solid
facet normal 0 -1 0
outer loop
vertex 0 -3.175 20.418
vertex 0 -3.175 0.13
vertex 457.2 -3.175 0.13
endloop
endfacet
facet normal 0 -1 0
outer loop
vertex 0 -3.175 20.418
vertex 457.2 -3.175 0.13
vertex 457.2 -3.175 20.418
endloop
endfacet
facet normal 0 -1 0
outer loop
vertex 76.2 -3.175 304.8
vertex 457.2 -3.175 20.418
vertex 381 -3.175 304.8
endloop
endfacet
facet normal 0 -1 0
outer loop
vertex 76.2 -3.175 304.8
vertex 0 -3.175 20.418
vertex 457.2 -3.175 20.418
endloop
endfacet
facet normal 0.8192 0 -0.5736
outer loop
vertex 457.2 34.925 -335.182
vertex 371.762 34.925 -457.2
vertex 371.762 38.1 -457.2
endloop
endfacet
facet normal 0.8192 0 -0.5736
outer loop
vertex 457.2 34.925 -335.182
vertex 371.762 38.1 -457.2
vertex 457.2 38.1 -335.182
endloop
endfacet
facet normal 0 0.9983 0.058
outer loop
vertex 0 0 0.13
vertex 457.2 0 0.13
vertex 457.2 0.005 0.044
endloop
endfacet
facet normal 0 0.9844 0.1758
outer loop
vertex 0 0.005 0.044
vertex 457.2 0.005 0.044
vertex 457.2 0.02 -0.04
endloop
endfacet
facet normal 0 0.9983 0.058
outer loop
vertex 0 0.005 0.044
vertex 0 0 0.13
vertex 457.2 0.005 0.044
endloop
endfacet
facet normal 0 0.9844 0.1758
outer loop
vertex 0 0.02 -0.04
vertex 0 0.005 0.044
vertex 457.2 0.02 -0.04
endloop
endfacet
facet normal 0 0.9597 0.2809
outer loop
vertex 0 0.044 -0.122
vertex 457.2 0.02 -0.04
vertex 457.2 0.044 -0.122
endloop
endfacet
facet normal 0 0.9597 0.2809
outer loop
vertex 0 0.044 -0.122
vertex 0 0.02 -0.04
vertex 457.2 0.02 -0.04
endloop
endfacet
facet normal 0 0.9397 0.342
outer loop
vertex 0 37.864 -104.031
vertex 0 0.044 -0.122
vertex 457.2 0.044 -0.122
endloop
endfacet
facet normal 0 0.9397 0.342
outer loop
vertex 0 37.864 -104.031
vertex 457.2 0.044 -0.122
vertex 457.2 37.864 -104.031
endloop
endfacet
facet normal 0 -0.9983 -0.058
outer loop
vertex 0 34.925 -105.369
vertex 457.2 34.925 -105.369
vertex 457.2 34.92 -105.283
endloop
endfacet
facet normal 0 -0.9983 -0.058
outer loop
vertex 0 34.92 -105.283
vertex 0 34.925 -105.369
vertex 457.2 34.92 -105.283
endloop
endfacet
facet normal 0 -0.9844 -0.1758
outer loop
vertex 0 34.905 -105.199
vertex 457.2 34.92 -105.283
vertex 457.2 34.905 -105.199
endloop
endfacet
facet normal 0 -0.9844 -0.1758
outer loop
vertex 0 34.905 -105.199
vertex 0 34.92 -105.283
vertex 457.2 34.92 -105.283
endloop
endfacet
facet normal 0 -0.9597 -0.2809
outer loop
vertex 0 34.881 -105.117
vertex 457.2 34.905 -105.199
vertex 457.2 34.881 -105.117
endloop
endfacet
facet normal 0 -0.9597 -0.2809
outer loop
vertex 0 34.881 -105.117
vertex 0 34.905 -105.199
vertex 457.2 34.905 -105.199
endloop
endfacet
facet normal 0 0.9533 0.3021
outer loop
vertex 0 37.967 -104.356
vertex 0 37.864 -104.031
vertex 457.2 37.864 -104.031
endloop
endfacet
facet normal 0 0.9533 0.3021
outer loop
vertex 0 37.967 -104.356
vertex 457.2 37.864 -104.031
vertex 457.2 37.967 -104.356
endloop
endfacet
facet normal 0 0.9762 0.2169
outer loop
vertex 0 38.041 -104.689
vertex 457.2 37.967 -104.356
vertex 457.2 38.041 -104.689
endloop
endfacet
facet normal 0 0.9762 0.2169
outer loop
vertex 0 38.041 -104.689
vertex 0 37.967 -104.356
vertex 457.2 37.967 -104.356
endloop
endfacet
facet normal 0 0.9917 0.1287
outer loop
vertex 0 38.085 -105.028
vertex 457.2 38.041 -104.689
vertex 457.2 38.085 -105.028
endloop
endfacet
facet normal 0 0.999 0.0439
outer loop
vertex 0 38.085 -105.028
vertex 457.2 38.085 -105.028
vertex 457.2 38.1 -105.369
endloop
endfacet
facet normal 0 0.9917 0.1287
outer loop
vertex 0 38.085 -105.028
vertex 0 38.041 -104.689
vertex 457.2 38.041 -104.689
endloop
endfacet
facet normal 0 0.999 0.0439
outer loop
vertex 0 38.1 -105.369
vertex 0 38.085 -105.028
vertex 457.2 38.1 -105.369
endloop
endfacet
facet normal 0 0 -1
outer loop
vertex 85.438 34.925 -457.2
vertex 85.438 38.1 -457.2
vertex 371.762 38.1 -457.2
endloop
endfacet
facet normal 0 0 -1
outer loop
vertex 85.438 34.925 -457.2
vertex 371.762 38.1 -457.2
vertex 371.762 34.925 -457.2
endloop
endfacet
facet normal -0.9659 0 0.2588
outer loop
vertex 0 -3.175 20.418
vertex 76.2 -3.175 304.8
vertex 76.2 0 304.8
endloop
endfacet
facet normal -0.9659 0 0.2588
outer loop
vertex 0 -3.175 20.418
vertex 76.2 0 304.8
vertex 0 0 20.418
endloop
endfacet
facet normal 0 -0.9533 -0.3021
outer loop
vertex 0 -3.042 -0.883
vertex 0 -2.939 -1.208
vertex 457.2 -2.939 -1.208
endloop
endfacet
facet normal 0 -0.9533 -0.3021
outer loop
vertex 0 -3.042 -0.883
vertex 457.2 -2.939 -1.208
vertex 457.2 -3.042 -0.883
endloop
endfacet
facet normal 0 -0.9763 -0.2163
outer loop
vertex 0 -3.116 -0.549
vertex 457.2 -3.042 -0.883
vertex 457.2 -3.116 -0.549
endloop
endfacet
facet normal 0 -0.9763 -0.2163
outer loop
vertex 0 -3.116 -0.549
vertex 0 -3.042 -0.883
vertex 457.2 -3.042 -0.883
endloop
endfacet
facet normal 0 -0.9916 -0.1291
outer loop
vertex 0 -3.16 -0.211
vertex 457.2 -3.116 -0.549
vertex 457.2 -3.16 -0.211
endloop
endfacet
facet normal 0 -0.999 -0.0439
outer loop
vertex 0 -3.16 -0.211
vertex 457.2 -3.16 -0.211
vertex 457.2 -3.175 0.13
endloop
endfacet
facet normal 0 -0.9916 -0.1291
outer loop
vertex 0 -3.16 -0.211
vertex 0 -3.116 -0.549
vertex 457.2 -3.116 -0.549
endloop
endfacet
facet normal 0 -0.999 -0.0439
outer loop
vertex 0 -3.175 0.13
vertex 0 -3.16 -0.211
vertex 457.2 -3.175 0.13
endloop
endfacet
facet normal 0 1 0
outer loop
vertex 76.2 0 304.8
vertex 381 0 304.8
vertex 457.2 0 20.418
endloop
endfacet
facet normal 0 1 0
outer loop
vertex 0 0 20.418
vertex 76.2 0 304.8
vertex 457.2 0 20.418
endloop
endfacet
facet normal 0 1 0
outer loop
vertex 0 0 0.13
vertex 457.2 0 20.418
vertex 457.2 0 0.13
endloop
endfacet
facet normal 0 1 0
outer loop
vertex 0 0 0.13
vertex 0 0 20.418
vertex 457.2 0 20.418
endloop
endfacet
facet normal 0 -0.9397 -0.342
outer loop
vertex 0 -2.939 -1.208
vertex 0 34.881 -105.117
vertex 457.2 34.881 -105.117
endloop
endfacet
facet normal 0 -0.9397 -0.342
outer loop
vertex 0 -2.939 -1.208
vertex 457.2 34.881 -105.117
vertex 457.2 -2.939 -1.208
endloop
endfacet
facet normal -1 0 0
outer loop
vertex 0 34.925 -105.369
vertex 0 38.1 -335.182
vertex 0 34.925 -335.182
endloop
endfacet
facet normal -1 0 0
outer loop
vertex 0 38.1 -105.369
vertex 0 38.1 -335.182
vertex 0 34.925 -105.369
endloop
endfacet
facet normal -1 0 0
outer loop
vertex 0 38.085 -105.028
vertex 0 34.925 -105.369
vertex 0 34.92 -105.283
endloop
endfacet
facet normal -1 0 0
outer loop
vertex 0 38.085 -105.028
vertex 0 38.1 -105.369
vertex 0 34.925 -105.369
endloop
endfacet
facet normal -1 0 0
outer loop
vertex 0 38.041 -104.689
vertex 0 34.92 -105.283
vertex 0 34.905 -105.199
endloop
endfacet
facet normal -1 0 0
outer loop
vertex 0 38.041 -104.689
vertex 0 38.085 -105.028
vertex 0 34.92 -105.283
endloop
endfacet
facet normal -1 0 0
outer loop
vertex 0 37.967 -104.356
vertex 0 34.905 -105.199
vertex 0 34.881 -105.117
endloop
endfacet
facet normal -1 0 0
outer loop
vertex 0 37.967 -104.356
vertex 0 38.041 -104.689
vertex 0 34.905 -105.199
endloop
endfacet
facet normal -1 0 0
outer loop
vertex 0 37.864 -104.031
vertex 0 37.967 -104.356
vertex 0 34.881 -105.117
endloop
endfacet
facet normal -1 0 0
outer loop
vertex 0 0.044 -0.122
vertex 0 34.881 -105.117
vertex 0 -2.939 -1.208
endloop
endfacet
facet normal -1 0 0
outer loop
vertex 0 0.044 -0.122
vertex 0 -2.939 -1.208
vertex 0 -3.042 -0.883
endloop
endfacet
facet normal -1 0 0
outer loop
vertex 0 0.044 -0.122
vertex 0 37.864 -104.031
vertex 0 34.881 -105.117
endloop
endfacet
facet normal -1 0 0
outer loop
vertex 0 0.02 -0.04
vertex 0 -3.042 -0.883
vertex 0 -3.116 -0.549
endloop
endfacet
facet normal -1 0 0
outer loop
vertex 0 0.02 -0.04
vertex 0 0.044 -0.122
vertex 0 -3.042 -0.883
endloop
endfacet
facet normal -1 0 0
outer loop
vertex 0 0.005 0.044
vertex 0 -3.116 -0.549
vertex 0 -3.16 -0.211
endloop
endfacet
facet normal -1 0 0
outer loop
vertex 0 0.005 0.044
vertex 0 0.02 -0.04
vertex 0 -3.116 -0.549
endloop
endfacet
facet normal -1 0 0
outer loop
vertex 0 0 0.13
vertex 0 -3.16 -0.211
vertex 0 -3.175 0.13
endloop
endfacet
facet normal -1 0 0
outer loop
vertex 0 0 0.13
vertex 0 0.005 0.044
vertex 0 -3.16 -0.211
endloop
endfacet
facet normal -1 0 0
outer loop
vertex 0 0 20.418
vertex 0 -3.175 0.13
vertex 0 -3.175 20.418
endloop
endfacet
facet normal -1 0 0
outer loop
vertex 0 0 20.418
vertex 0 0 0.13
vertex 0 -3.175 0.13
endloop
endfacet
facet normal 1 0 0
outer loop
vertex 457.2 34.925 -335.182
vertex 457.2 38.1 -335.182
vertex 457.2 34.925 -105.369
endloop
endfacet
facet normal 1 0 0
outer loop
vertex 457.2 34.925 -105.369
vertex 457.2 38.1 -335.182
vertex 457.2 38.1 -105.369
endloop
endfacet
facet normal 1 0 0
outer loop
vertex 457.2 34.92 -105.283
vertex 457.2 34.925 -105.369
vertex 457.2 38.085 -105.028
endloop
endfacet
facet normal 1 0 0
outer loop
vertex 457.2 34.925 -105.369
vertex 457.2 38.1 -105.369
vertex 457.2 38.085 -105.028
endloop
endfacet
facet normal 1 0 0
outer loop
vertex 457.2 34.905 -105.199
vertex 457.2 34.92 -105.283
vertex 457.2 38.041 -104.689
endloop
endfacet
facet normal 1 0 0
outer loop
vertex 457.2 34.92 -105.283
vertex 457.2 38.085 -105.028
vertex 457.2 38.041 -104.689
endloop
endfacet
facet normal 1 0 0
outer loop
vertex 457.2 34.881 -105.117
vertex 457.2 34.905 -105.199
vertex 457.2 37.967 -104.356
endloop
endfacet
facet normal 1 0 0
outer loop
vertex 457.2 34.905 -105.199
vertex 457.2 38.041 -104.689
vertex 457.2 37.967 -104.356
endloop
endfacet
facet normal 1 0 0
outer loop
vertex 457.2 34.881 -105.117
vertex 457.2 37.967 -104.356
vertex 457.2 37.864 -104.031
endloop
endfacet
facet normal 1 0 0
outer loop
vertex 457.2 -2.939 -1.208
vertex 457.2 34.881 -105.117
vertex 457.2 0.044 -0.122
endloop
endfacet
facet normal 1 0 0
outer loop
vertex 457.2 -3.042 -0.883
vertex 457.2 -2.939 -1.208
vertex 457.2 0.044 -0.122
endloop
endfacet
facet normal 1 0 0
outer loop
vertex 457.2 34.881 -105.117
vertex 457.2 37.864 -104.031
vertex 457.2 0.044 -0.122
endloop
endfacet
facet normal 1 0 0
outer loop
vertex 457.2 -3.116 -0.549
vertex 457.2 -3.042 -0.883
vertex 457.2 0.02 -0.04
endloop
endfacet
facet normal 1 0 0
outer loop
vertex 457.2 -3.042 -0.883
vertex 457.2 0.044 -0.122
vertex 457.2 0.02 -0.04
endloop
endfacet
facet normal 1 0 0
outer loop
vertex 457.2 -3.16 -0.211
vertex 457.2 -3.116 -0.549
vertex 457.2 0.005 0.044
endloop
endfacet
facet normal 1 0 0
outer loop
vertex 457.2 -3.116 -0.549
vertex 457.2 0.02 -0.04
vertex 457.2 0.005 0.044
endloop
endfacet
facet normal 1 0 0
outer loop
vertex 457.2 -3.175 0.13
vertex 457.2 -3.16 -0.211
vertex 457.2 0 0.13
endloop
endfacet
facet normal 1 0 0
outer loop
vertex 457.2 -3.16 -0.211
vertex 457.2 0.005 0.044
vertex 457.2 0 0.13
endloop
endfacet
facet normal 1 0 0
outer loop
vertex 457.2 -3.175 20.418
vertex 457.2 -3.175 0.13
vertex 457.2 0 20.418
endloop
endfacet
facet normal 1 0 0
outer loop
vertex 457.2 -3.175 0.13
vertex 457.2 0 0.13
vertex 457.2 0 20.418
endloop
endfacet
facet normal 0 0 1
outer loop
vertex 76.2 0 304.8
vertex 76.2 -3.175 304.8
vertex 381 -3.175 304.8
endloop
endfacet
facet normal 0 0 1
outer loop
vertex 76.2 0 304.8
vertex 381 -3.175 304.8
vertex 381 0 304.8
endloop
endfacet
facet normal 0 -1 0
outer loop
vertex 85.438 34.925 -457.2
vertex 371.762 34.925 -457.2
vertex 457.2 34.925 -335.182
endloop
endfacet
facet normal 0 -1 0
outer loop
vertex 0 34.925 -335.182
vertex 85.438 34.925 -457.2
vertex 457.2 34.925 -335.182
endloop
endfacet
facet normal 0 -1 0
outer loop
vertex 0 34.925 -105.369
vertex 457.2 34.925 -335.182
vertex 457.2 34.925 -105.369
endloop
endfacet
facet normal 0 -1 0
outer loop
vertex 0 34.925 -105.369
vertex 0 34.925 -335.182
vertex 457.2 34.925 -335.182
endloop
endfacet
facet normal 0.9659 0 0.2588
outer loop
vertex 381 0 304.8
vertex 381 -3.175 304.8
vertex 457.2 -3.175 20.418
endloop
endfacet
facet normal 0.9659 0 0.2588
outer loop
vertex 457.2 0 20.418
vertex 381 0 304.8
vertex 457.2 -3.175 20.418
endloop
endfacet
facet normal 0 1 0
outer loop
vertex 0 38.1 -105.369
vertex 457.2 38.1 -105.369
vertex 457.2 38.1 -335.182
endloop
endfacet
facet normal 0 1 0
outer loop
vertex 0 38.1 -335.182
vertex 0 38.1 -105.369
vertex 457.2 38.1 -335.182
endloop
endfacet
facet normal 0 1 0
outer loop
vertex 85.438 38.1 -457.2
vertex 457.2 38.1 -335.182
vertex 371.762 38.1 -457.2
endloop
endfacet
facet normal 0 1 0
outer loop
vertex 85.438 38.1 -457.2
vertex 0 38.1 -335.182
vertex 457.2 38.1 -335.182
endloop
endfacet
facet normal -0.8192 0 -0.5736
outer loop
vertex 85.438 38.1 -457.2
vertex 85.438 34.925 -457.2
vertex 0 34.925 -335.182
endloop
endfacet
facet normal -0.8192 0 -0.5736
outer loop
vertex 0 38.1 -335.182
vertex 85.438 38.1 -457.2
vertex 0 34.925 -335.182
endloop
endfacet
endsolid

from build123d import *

# Parameters (mm, degrees)
BASE_FLANGE1_DEPTH      = 457.2
CUT_EXTRUDE1_DEPTH      = 648.7
CUT_EXTRUDE1_DEPTH_BACK = 648.7


# Sheet-metal steps are written as plain solids
with BuildPart() as part:
    # Sketch1 → Base-Flange1 (new body)
    with BuildSketch(Plane(origin=(0, 0, 0), x_dir=(0, 0, -1), z_dir=(1, 0, 0))):
        with BuildLine():
            Line((-304.8, 0), (-0.129882454, 0))
            ThreePointArc((-0.129882454, 0), (-0.001973206, 0.011190609), (0.122049584, 0.044422416))
            Line((0.122049584, 0.044422416), (104.030764306, 37.864101655))
            ThreePointArc((104.030764306, 37.864101655), (104.689368087, 38.040574007), (105.368610299, 38.1))
            Line((105.368610299, 38.1), (457.2, 38.1))
            Line((457.2, 38.1), (457.2, 34.925))
            Line((457.2, 34.925), (105.368610299, 34.925))
            ThreePointArc((105.368610299, 34.925), (105.240701051, 34.913809391), (105.116678261, 34.880577584))
            Line((105.116678261, 34.880577584), (1.207963539, -2.939101655))
            ThreePointArc((1.207963539, -2.939101655), (0.549359758, -3.115574007), (-0.129882454, -3.175))
            Line((-0.129882454, -3.175), (-304.8, -3.175))
            Line((-304.8, -3.175), (-304.8, 0))
        make_face()
    extrude(amount=BASE_FLANGE1_DEPTH)

    # Sketch6 → Cut-Extrude1 (cut, two sides: drawn at the far end of the back side and taken through both)
    with BuildSketch(Plane(origin=(0, 0, 0), x_dir=(1, 0, 0), z_dir=(0, 1, 0)).offset(-CUT_EXTRUDE1_DEPTH_BACK)):
        Polygon((0, -304.8), (76.2, -304.8), (0, -20.417728463), align=None)
        Polygon((0, 335.182271537), (0, 457.2), (85.437733265, 457.2), align=None)
        Polygon((457.2, 457.2), (371.762266735, 457.2), (457.2, 335.182271537), align=None)
        Polygon((381, -304.8), (457.2, -20.417728463), (457.2, -304.8), align=None)
    extrude(amount=CUT_EXTRUDE1_DEPTH + CUT_EXTRUDE1_DEPTH_BACK, mode=Mode.SUBTRACT)


solid = part.part
